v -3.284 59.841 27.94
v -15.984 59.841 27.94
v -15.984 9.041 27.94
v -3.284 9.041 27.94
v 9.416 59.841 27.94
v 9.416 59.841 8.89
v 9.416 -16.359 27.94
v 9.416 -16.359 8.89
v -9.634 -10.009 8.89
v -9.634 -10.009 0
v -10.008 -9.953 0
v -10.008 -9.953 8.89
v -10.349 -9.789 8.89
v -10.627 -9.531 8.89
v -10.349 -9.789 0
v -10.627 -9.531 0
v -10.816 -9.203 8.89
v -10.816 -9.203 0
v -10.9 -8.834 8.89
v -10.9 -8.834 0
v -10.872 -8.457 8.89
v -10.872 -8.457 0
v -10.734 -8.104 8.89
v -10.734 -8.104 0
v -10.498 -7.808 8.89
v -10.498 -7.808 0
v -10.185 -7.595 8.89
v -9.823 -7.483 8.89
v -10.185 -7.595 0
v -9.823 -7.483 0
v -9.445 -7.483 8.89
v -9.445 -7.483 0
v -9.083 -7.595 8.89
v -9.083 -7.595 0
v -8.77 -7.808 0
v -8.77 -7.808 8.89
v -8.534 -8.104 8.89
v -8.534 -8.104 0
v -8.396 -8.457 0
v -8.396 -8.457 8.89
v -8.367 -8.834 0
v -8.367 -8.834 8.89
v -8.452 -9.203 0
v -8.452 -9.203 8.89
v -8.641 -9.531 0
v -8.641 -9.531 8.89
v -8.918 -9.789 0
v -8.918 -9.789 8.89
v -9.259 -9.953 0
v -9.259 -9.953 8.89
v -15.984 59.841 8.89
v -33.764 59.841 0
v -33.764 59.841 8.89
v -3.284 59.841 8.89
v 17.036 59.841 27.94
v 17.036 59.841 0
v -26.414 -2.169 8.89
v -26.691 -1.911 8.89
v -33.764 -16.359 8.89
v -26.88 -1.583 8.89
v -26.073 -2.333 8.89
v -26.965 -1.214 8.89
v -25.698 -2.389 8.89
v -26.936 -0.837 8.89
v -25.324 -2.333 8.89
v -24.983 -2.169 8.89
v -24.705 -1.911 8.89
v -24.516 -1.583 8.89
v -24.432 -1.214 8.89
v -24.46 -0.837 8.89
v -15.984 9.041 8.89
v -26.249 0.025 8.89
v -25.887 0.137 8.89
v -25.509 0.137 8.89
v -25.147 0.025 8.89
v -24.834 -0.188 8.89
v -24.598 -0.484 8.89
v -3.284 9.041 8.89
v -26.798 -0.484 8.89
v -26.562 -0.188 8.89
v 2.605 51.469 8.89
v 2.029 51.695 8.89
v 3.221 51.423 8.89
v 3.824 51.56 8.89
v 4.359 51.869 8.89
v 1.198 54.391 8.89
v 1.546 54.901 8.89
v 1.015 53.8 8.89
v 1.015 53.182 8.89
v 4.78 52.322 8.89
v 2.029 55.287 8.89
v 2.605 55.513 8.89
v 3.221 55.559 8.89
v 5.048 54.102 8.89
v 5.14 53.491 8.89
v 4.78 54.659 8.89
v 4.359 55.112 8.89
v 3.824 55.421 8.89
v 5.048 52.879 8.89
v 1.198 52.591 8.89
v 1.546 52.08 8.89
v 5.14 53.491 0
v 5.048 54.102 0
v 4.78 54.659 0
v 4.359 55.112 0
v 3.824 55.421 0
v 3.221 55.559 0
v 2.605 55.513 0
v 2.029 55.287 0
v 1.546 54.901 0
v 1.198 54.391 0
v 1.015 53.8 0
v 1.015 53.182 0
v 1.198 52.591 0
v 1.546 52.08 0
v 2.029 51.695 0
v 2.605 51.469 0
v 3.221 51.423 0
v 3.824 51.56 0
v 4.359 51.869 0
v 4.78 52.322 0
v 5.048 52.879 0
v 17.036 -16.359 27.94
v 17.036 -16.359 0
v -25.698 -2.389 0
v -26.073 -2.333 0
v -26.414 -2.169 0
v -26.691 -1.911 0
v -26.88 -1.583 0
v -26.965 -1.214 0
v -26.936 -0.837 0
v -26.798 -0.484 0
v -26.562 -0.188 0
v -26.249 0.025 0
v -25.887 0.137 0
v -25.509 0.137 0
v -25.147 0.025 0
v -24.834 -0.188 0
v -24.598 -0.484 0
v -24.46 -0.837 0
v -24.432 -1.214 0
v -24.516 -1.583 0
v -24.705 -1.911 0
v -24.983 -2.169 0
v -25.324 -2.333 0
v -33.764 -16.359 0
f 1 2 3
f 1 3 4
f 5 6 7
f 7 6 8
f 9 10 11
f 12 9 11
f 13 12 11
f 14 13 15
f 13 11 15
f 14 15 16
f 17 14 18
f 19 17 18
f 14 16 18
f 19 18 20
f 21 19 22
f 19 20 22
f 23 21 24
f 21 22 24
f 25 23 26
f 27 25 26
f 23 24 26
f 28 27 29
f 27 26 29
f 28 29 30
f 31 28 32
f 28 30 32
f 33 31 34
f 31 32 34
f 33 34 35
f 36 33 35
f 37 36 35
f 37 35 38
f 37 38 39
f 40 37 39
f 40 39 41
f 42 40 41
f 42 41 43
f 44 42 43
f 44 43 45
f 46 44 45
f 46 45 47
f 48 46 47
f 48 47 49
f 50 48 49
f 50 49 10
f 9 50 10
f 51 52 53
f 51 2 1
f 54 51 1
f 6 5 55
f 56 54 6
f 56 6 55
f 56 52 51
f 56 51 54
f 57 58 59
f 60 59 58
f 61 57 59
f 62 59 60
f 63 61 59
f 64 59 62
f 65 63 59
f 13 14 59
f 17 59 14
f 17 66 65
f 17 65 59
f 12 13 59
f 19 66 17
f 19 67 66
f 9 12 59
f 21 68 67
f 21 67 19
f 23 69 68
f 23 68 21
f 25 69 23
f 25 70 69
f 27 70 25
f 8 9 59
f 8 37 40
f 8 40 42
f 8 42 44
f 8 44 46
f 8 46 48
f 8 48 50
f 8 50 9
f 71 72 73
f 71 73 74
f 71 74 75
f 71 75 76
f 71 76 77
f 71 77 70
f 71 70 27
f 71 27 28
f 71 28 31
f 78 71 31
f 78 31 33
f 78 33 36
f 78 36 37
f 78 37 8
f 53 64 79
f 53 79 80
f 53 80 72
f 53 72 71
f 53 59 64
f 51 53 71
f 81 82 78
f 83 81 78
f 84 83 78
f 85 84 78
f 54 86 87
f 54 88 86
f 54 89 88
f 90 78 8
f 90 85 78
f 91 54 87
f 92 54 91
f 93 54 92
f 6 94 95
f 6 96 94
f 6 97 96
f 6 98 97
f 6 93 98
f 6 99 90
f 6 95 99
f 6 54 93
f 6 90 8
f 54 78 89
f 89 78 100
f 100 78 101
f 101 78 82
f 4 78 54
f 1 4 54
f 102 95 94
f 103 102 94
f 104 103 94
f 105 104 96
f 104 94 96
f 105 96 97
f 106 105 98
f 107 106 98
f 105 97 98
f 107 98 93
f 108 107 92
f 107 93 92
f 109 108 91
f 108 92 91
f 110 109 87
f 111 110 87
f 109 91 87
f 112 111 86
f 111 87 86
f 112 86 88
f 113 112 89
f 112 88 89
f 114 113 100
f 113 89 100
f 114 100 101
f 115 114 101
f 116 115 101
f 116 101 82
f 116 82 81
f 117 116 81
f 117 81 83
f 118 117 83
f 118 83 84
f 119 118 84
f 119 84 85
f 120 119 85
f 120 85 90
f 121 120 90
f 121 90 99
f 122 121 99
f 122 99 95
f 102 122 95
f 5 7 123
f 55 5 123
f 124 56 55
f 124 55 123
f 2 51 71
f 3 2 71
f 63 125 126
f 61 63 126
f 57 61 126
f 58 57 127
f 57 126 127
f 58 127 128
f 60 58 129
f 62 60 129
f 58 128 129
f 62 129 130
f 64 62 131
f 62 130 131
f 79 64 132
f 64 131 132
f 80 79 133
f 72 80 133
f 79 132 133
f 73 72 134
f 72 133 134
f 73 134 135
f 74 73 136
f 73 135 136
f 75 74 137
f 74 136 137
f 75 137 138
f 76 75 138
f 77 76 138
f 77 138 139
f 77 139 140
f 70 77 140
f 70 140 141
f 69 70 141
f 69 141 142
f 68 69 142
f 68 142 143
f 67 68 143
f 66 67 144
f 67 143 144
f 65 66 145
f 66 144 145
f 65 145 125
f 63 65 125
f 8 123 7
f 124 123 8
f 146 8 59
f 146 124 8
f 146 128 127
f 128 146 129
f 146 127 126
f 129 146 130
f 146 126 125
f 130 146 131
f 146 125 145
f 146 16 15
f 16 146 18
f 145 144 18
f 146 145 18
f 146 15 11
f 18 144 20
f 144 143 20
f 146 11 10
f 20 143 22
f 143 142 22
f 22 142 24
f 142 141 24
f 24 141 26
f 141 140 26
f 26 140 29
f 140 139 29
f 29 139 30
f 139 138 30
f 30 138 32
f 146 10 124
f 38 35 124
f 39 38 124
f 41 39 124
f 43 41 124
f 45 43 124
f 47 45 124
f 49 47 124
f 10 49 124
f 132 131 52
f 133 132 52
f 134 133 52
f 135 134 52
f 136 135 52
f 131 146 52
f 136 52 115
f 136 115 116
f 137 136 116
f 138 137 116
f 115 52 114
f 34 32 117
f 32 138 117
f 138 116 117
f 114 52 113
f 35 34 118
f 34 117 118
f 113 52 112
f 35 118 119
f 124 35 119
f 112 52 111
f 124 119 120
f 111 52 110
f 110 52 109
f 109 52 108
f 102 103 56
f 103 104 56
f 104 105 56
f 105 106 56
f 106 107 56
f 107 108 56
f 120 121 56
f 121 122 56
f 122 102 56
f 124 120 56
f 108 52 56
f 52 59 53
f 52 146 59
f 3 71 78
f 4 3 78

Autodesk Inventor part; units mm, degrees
ref_plane "YZ Plane" through (0, 0, 0) normal (1, 0, 0) x (0, 1, 0)
ref_plane "XZ Plane" through (0, 0, 0) normal (0, 1, 0) x (-1, 0, 0)
ref_plane "XY Plane" through (0, 0, 0) normal (0, 0, 1) x (1, 0, 0)
sketch "Sketch1" plane through (0, 0, 0) normal (0, 0, 1) x (1, 0, 0)
  line L0 (-33.7638, 59.8408) -> (17.0362, 59.8408)
  line L1 (17.0362, 59.8408) -> (17.0362, -16.3592)
  line L2 (17.0362, -16.3592) -> (-33.7638, -16.3592)
  line L3 (-33.7638, -16.3592) -> (-33.7638, 59.8408)
  dimension "d0" = 50.8
  dimension "d1" = 76.2
extrude "Extrusion1" add sketch "Sketch1" along normal blind 8.89
sketch "Sketch2" plane through (0, 0, 8.89) normal (0, 0, 1) x (1, 0, 0)
  line L0 (17.0362, 59.8408) -> (17.0362, -16.3592) projected
  line L1 (-33.7638, 59.8408) -> (17.0362, 59.8408) projected
  line L2 (17.0362, -16.3592) -> (-33.7638, -16.3592) projected
  line L3 (9.4162, 59.8408) -> (9.4162, -16.3592)
  dimension "d4" = 7.62
extrude "Extrusion2" add sketch "Sketch2" along normal blind 19.05
sketch "Sketch3" plane through (0, 0, 8.89) normal (0, 0, 1) x (1, 0, 0)
  point P0 (9.4162, -16.3592)
  point P1 (-33.7638, -16.3592)
  point P2 (-9.6338, -8.7392)
  point P3 (-25.6982, -1.1192)
  dimension "d7" = 19.05
  dimension "d8" = 7.62
  dimension "d9" = 17.78
  dimension "d10" = 15.24
hole "Hole1" at (-9.6338, -8.7392, 8.89) at (-25.6982, -1.1192, 8.89) direction (0, 0, -1) diameter 2.54 depth 12.7 tip angle 118
sketch "Sketch4" plane through (0, 0, 8.89) normal (0, 0, 1) x (1, 0, 0)
  line L0 (9.4162, -16.3592) -> (9.4162, 59.8408) projected
  line L1 (-33.7638, 59.8408) -> (9.4162, 59.8408) projected
  line L2 (-15.9838, 59.8408) -> (-15.9838, 9.0408)
  line L3 (-15.9838, 9.0408) -> (-3.2838, 9.0408)
  line L4 (-3.2838, 9.0408) -> (-3.2838, 59.8408)
  dimension "d18" = 12.7
  dimension "d19" = 12.7
  dimension "d22" = 50.8
extrude "Extrusion3" add sketch "Sketch4" along normal up to surface (19.05 mm away)
sketch "Sketch5" plane through (0, 0, 8.89) normal (0, 0, 1) x (1, 0, 0)
  line L0 (-3.2838, 59.8408) -> (9.4162, 59.8408) projected
  line L1 (-3.2838, 59.8408) -> (-3.2838, 9.0408) projected
  circle A0 centre (3.0662, 53.4908) radius 2.074
  dimension "d24" = 6.35
  dimension "d25" = 6.35
extrude "Extrusion4" cut sketch "Sketch5" against normal up to next
properties part number "base"
